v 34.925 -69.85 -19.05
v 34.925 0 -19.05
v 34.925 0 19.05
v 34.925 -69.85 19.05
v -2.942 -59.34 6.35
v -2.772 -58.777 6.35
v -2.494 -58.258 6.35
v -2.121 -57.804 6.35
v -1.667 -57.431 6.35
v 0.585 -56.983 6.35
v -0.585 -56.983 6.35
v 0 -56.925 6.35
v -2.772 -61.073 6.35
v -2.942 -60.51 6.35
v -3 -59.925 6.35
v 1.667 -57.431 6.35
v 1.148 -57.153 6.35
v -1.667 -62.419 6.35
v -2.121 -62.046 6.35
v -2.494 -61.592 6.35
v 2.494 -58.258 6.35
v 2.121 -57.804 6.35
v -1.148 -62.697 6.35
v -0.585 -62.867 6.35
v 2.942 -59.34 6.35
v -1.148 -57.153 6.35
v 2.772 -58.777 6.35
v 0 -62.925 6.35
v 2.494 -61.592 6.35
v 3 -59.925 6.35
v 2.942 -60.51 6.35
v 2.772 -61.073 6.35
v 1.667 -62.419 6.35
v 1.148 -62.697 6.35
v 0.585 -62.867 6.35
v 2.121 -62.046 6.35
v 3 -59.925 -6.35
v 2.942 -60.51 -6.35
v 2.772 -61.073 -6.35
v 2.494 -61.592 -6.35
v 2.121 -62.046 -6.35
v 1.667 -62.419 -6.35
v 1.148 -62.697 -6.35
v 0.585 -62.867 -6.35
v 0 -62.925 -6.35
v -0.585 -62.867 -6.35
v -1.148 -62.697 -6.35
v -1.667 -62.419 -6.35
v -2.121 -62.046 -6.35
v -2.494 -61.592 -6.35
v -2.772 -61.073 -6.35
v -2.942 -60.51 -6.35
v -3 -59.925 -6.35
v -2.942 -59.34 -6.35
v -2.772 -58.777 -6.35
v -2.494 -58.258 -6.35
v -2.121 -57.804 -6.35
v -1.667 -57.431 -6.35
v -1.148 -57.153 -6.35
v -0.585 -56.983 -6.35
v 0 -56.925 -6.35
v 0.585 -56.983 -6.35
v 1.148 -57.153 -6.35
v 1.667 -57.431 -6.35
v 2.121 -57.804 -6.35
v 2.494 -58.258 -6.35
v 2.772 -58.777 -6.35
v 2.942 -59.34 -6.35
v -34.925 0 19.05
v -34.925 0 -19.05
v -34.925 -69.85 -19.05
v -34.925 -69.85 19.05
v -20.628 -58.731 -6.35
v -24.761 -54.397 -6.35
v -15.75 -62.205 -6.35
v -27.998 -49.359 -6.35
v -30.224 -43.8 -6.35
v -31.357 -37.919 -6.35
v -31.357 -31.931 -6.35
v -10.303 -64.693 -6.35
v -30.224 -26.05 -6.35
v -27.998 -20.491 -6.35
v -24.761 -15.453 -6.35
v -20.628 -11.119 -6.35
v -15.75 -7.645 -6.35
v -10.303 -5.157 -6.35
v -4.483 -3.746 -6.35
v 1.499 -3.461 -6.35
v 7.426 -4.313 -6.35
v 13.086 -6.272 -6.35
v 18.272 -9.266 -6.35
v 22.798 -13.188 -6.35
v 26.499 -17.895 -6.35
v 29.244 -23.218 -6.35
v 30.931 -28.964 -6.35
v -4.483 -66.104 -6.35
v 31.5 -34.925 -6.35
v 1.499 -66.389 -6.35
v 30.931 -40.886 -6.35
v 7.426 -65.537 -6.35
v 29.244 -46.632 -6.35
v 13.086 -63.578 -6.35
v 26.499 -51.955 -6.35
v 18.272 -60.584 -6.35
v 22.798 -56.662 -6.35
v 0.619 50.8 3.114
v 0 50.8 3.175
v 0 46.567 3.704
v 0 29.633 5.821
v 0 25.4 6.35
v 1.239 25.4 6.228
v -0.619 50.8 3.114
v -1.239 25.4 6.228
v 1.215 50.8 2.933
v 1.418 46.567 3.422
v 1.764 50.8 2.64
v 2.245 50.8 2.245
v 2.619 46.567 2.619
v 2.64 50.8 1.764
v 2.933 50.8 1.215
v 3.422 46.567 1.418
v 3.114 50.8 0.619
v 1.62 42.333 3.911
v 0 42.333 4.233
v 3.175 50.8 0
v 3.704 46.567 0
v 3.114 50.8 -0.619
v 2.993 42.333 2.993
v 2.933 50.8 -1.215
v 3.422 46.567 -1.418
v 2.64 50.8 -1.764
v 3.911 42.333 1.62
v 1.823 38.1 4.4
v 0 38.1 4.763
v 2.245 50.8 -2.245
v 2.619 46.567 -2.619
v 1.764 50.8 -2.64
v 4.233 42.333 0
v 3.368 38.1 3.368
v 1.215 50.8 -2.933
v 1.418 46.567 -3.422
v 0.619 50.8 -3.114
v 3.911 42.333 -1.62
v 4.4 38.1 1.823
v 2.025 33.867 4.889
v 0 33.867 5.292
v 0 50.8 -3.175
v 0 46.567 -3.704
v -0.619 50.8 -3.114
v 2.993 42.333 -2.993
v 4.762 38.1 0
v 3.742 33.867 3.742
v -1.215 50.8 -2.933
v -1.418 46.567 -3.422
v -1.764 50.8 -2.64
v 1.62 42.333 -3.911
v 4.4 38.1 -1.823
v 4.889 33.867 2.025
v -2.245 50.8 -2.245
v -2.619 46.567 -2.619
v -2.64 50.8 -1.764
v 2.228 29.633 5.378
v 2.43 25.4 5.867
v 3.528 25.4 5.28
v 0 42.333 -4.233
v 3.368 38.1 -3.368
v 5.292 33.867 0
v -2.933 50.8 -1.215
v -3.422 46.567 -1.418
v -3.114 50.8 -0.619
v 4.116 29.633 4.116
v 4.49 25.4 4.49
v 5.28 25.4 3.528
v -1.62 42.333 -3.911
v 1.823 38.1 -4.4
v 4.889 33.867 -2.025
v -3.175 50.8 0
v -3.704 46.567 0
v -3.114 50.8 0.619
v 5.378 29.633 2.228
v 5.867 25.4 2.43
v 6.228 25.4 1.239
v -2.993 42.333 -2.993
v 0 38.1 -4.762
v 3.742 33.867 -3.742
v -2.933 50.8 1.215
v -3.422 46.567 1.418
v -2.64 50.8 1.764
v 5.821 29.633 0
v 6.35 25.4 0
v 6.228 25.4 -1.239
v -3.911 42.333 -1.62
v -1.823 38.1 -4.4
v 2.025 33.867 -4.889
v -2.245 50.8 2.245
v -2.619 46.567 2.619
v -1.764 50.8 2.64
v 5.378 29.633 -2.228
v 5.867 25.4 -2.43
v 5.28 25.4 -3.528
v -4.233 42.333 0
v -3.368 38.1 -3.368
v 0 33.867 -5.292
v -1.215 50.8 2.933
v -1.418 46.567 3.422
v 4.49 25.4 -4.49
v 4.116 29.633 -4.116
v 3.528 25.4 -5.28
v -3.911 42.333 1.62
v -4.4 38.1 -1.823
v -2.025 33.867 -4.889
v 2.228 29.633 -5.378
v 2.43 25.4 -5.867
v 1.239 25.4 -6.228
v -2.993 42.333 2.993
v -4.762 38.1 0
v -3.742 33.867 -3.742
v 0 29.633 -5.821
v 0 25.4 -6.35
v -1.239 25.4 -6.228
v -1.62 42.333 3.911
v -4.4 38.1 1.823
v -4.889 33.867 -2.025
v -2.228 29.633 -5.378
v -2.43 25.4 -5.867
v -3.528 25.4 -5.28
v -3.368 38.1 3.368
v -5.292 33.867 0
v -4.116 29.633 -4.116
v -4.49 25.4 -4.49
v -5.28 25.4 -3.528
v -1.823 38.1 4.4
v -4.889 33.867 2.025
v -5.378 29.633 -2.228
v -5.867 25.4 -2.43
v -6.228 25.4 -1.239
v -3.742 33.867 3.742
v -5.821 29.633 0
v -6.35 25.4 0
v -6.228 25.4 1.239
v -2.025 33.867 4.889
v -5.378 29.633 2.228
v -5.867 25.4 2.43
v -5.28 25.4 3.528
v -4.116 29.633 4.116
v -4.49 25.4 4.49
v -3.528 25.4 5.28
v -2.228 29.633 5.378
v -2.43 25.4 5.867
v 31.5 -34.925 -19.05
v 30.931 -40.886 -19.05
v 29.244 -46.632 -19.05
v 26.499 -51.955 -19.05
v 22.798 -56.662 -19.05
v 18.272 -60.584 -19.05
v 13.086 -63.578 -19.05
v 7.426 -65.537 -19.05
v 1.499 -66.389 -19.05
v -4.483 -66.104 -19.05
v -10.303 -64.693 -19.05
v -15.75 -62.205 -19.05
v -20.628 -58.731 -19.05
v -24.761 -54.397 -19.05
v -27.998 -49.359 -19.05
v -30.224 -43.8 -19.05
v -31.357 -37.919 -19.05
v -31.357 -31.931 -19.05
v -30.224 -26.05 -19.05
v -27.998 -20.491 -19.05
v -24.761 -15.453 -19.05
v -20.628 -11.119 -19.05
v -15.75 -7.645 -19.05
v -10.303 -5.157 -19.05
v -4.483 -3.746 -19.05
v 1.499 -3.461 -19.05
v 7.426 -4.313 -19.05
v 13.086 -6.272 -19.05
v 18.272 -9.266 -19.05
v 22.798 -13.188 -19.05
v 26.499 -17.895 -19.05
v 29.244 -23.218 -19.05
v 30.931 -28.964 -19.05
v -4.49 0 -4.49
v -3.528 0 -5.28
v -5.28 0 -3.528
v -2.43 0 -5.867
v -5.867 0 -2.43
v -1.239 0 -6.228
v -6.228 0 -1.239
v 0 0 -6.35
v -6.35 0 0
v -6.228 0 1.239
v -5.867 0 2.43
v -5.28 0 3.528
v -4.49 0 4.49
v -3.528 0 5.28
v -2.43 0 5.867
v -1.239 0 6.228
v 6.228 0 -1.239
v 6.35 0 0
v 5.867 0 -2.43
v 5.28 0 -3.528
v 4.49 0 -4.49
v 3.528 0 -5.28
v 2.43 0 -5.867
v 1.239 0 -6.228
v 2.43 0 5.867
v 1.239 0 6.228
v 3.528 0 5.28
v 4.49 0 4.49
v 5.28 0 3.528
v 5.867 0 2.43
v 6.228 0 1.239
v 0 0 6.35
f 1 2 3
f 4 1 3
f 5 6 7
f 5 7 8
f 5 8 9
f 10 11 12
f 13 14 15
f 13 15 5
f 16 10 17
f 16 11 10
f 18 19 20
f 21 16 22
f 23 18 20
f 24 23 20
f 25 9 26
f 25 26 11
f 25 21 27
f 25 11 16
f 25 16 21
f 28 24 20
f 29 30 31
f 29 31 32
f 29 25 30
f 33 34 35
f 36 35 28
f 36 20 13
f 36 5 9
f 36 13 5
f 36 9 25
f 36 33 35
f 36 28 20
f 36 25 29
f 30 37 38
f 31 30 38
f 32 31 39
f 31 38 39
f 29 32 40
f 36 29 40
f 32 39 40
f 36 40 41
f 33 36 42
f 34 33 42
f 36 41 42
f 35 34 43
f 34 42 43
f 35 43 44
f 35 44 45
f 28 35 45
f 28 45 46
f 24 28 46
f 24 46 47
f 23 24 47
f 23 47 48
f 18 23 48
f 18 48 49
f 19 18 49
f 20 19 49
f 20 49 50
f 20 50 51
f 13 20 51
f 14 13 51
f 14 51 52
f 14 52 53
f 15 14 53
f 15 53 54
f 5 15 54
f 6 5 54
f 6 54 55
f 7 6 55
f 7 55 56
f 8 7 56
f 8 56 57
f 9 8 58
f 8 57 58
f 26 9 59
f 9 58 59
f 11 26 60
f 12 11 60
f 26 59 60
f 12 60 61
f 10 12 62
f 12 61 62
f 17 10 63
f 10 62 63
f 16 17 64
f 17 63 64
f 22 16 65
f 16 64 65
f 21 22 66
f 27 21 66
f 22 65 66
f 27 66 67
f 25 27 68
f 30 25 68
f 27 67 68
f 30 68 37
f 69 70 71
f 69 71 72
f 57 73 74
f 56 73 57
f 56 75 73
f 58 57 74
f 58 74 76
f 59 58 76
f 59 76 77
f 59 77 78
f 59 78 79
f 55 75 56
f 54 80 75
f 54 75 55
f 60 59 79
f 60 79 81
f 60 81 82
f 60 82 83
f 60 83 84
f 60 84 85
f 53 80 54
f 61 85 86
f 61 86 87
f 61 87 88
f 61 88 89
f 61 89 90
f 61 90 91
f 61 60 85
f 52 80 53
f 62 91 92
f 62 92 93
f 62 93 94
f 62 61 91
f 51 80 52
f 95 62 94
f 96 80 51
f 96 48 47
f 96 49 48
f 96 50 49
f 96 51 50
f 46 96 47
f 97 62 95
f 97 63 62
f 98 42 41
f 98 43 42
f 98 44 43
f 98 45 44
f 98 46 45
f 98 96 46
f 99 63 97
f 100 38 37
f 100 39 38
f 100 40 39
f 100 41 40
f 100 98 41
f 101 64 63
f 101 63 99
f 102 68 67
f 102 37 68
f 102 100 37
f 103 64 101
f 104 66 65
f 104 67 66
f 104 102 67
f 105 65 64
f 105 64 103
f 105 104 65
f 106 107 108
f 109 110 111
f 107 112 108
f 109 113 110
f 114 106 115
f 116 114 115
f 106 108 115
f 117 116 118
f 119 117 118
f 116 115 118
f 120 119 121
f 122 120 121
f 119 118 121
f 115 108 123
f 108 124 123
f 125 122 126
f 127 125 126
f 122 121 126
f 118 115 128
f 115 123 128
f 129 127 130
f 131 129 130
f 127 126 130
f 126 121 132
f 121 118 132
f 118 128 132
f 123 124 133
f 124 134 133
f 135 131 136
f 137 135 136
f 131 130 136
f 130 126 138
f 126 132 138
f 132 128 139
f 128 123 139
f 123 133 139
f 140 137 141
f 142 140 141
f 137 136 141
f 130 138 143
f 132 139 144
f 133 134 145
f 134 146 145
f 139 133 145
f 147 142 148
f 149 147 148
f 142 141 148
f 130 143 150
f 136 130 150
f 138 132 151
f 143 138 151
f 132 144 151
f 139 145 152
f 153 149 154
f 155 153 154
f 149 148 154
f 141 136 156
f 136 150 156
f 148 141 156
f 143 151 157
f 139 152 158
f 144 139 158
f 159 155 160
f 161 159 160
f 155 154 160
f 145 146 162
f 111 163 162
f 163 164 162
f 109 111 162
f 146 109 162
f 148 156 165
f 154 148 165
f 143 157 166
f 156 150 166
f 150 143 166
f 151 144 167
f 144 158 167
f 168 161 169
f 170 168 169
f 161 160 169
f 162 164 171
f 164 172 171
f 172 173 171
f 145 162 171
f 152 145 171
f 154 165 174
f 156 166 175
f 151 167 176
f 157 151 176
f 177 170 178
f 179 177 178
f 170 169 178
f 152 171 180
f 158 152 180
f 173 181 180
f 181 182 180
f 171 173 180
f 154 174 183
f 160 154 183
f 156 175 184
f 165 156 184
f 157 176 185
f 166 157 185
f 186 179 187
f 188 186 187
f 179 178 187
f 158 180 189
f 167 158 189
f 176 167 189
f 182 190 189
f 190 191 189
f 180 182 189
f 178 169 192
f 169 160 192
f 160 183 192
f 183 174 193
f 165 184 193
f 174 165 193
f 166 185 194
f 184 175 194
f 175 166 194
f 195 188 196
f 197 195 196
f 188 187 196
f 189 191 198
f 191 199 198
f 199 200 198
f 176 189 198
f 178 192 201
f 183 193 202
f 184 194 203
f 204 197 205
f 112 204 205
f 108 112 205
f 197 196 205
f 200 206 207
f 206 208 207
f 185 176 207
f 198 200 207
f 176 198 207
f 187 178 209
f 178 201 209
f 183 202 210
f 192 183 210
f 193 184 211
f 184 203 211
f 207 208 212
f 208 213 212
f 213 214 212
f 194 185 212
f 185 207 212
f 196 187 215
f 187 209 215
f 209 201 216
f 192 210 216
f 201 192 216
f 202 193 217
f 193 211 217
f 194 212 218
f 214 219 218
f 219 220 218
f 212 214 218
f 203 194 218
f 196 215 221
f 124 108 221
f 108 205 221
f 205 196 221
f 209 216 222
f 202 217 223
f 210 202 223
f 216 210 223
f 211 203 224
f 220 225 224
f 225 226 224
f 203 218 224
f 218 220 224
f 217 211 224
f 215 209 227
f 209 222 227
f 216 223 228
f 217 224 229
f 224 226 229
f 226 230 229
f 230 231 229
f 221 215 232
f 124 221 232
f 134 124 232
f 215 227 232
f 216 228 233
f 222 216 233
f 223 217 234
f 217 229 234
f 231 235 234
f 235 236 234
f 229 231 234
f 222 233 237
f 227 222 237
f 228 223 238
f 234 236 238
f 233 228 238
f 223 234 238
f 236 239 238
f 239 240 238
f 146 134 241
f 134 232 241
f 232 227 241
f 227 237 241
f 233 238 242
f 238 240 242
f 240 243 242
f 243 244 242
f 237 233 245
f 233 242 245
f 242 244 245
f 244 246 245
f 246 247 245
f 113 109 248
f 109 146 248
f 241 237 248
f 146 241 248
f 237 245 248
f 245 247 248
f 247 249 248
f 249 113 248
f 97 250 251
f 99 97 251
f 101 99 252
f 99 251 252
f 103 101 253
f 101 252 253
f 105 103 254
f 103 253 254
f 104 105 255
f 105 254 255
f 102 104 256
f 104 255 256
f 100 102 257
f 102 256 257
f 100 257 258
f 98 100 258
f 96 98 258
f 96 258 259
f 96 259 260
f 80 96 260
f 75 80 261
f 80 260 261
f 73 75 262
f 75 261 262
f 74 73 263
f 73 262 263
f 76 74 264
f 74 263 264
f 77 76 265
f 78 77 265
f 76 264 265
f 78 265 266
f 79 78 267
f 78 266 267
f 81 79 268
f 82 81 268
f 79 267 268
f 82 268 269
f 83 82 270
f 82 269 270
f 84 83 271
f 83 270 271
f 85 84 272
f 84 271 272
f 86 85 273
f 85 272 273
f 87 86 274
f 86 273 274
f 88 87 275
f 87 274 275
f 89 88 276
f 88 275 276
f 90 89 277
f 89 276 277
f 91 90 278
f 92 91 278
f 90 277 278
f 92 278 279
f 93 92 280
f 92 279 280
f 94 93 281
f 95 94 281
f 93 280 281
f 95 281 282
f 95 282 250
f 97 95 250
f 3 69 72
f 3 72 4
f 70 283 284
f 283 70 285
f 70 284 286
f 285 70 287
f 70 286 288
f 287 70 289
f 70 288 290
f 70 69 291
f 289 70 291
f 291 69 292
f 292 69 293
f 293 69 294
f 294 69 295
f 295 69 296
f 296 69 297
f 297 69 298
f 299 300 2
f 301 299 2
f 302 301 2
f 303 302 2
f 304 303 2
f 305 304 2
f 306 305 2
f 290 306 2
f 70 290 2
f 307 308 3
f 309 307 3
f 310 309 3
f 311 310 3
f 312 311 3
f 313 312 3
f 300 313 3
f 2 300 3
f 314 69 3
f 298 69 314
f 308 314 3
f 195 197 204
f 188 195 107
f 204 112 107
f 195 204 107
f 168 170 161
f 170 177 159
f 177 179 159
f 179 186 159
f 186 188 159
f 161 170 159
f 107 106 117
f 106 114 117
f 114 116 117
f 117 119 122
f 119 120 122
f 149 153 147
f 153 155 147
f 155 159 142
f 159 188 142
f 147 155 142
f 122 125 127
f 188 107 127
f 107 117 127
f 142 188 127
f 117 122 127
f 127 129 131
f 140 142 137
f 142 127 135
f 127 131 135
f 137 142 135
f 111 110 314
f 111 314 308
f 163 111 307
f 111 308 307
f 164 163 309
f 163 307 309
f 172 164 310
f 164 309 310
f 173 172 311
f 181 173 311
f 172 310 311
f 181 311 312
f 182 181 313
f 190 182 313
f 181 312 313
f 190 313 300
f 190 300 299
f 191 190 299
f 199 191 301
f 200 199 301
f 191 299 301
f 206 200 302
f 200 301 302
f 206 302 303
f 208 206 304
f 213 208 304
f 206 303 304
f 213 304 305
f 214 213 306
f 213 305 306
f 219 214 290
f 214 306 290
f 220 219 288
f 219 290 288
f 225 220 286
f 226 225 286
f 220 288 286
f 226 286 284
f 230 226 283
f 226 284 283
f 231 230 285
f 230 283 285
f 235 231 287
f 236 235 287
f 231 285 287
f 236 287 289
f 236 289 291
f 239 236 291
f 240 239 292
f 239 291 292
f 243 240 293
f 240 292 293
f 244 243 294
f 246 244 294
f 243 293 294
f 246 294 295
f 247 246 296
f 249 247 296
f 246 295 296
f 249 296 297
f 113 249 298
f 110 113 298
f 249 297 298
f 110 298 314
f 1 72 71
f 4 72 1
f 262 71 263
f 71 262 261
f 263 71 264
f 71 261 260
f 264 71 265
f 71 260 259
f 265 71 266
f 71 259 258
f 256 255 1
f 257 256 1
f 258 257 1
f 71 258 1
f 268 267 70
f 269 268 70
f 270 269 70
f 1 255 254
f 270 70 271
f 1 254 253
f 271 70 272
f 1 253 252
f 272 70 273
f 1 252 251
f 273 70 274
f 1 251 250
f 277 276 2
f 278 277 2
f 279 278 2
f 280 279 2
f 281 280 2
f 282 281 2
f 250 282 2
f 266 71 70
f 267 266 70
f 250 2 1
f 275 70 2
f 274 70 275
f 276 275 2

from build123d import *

# Parameters (mm, degrees)
F2_W     = 69.85
F2_H     = 38.1
F3_DEPTH = 69.85
F4_R     = 3
F4_R_2   = 31.5
F5_DEPTH = 12.7
F6_DEPTH = 25.4


with BuildPart() as f1:
    # F0 (on Right) → F1 (revolve)
    with BuildSketch(Plane.YZ):
        Polygon((0, 6.35), (0, 0), (50.8, 0), (50.8, 3.175), (25.4, 6.35), align=None)
    revolve(axis=Axis((0, 25.4, 0), (0, 1, 0)))

    # F2 (on Front) → F3 (join)
    with BuildSketch(Plane.XZ):
        Rectangle(F2_W, F2_H)
    extrude(amount=F3_DEPTH)

    # F4 (on face) → F5 (cut)
    with BuildSketch(Plane(origin=(0, 0, -19.05), x_dir=(1, 0, 0), z_dir=(0, 0, -1))):
        with Locations((0, 59.925)):
            Circle(F4_R)
        with Locations((0, 34.925)):
            Circle(F4_R_2)
        with Locations((0, 59.925)):
            Circle(F4_R, mode=Mode.SUBTRACT)
    extrude(amount=-F5_DEPTH, mode=Mode.SUBTRACT)

    # F4 (on face) → F6 (cut)
    with BuildSketch(Plane(origin=(0, 0, -19.05), x_dir=(1, 0, 0), z_dir=(0, 0, -1))):
        with Locations((0, 59.925)):
            Circle(F4_R)
    extrude(amount=-F6_DEPTH, mode=Mode.SUBTRACT)


solid = f1.part
